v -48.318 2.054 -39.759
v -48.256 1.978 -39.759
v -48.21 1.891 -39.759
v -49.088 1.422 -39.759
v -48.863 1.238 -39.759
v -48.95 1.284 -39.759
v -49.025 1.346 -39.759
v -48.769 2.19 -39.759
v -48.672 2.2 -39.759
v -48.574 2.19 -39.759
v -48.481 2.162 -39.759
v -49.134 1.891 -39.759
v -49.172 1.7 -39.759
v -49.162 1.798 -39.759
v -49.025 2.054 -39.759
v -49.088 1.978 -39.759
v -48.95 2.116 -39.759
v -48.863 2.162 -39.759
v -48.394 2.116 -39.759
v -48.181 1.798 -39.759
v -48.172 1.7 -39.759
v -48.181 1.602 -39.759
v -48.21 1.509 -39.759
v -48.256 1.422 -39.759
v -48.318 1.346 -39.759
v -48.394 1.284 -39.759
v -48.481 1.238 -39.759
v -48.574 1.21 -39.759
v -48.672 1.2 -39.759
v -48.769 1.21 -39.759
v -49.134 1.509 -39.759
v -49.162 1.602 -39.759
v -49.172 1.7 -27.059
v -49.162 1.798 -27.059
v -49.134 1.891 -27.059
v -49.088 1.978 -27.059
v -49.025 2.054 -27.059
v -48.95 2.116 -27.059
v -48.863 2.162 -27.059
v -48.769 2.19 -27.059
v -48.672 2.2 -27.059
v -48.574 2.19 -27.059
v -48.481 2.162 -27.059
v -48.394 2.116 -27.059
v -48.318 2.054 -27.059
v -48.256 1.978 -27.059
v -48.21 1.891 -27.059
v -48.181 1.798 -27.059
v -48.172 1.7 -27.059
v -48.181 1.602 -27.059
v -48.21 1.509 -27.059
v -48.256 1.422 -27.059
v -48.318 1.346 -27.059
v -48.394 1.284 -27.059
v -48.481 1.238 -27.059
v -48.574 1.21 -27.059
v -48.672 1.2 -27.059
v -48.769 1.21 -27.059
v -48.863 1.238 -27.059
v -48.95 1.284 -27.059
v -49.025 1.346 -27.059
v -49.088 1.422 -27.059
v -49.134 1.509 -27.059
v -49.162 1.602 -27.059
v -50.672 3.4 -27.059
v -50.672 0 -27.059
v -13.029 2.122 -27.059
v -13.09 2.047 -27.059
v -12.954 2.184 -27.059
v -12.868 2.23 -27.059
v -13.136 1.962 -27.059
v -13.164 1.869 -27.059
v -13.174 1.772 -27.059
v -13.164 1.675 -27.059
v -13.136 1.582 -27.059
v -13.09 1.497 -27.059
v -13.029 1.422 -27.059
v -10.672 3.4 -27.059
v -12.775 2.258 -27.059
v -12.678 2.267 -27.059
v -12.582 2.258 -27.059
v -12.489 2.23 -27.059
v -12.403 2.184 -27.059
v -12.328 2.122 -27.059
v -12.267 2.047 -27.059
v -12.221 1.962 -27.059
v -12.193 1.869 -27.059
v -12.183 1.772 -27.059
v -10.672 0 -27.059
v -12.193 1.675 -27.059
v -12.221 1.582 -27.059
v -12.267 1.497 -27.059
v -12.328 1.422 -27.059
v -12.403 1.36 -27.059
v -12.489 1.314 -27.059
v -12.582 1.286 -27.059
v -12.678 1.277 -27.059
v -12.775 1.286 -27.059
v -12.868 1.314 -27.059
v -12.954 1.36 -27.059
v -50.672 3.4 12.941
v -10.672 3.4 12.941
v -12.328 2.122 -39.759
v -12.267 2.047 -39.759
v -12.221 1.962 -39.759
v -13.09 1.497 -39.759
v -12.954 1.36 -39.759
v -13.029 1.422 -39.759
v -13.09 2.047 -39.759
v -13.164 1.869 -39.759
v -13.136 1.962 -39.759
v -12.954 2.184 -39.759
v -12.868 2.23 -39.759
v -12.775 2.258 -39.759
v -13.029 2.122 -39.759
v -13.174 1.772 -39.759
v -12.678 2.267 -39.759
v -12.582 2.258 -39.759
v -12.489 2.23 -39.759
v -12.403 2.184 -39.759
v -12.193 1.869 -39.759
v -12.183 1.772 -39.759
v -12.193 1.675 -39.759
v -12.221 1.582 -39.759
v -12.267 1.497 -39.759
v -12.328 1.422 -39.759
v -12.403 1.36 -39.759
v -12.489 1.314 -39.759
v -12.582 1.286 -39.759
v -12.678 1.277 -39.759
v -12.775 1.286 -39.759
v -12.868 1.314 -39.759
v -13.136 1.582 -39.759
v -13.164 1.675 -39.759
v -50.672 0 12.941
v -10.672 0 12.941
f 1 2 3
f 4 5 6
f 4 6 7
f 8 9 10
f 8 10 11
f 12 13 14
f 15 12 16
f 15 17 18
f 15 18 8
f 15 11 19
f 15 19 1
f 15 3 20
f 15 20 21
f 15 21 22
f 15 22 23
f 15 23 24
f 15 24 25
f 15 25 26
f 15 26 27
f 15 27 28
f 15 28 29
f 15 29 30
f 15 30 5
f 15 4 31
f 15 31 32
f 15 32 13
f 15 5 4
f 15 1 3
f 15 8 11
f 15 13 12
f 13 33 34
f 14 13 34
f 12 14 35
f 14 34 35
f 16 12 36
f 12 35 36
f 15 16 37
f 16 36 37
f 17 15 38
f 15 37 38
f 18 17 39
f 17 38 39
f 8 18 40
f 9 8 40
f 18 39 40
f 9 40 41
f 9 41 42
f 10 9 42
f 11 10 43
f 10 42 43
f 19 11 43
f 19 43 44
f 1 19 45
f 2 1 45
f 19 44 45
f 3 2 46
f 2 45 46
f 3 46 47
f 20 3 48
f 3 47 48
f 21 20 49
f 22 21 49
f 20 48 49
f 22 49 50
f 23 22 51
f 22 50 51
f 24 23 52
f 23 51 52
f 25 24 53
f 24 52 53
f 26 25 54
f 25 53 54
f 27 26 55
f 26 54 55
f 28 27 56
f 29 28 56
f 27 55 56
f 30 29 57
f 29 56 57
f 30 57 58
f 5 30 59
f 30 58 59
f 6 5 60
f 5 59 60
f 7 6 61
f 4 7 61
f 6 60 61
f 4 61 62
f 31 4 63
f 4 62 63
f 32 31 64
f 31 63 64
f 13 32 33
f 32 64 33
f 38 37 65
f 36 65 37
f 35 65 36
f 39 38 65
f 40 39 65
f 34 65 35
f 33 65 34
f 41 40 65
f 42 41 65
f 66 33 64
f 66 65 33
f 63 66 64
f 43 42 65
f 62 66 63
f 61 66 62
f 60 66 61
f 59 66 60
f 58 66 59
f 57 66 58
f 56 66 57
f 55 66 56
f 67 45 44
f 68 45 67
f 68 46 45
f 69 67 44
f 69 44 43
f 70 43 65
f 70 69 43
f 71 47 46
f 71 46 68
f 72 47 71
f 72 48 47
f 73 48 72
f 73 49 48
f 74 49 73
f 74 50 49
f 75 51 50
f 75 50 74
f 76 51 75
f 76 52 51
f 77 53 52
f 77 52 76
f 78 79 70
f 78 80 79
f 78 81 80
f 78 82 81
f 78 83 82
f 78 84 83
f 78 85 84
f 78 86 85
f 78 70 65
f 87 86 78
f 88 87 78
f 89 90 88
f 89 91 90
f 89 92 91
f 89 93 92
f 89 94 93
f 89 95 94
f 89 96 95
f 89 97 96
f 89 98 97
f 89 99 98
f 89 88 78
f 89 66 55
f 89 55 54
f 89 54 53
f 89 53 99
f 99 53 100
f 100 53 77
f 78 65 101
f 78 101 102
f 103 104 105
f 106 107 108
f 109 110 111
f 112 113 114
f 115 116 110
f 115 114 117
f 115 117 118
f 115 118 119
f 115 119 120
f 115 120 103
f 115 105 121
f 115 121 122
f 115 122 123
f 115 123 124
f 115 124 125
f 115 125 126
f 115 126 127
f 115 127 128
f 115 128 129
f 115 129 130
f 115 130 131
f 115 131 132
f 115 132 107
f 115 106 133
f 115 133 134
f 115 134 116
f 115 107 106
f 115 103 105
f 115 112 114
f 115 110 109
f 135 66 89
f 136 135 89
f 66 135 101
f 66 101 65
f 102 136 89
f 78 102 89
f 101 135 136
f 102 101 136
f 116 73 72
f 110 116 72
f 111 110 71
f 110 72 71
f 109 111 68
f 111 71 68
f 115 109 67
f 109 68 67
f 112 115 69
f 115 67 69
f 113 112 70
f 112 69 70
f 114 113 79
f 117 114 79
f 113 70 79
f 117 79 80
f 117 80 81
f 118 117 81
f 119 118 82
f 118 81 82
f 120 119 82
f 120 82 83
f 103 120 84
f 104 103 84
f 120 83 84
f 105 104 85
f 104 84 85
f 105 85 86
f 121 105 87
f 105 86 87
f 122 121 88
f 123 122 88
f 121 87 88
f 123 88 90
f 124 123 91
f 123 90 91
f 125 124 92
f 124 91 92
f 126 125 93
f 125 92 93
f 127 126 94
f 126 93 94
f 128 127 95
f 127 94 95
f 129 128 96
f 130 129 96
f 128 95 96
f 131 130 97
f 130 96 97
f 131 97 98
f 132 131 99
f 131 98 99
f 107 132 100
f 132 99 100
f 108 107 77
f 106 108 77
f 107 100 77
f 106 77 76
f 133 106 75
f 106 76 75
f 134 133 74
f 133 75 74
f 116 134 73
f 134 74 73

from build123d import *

# Parameters (mm, degrees)
SKETCH1_W           = 40
SKETCH1_H           = 40
BOSS_EXTRUDE1_DEPTH = 3.4
SKETCH2_R           = 0.5
BOSS_EXTRUDE2_DEPTH = 12.7
SKETCH3_R           = 0.4953
BOSS_EXTRUDE3_DEPTH = 12.7


with BuildPart() as part:
    # Sketch1 → Boss-Extrude1 (new body)
    with BuildSketch(Plane(origin=(0, 0, 0), x_dir=(1, 0, 0), z_dir=(0, 1, 0))):
        with Locations((-30.671871438, 7.059468761)):
            Rectangle(SKETCH1_W, SKETCH1_H)
    extrude(amount=BOSS_EXTRUDE1_DEPTH)

    # Sketch2 → Boss-Extrude2 (add)
    with BuildSketch(Plane(origin=(0, 0, -27.059468761), x_dir=(-1, 0, 0), z_dir=(0, 0, -1))):
        with Locations((48.671871438, 1.7)):
            Circle(SKETCH2_R)
    extrude(amount=BOSS_EXTRUDE2_DEPTH)

    # Sketch3 → Boss-Extrude3 (add)
    with BuildSketch(Plane(origin=(0, 0, -27.059468761), x_dir=(-1, 0, 0), z_dir=(0, 0, -1))):
        with Locations((12.678471438, 1.772009117)):
            Circle(SKETCH3_R)
    extrude(amount=BOSS_EXTRUDE3_DEPTH)


solid = part.part
